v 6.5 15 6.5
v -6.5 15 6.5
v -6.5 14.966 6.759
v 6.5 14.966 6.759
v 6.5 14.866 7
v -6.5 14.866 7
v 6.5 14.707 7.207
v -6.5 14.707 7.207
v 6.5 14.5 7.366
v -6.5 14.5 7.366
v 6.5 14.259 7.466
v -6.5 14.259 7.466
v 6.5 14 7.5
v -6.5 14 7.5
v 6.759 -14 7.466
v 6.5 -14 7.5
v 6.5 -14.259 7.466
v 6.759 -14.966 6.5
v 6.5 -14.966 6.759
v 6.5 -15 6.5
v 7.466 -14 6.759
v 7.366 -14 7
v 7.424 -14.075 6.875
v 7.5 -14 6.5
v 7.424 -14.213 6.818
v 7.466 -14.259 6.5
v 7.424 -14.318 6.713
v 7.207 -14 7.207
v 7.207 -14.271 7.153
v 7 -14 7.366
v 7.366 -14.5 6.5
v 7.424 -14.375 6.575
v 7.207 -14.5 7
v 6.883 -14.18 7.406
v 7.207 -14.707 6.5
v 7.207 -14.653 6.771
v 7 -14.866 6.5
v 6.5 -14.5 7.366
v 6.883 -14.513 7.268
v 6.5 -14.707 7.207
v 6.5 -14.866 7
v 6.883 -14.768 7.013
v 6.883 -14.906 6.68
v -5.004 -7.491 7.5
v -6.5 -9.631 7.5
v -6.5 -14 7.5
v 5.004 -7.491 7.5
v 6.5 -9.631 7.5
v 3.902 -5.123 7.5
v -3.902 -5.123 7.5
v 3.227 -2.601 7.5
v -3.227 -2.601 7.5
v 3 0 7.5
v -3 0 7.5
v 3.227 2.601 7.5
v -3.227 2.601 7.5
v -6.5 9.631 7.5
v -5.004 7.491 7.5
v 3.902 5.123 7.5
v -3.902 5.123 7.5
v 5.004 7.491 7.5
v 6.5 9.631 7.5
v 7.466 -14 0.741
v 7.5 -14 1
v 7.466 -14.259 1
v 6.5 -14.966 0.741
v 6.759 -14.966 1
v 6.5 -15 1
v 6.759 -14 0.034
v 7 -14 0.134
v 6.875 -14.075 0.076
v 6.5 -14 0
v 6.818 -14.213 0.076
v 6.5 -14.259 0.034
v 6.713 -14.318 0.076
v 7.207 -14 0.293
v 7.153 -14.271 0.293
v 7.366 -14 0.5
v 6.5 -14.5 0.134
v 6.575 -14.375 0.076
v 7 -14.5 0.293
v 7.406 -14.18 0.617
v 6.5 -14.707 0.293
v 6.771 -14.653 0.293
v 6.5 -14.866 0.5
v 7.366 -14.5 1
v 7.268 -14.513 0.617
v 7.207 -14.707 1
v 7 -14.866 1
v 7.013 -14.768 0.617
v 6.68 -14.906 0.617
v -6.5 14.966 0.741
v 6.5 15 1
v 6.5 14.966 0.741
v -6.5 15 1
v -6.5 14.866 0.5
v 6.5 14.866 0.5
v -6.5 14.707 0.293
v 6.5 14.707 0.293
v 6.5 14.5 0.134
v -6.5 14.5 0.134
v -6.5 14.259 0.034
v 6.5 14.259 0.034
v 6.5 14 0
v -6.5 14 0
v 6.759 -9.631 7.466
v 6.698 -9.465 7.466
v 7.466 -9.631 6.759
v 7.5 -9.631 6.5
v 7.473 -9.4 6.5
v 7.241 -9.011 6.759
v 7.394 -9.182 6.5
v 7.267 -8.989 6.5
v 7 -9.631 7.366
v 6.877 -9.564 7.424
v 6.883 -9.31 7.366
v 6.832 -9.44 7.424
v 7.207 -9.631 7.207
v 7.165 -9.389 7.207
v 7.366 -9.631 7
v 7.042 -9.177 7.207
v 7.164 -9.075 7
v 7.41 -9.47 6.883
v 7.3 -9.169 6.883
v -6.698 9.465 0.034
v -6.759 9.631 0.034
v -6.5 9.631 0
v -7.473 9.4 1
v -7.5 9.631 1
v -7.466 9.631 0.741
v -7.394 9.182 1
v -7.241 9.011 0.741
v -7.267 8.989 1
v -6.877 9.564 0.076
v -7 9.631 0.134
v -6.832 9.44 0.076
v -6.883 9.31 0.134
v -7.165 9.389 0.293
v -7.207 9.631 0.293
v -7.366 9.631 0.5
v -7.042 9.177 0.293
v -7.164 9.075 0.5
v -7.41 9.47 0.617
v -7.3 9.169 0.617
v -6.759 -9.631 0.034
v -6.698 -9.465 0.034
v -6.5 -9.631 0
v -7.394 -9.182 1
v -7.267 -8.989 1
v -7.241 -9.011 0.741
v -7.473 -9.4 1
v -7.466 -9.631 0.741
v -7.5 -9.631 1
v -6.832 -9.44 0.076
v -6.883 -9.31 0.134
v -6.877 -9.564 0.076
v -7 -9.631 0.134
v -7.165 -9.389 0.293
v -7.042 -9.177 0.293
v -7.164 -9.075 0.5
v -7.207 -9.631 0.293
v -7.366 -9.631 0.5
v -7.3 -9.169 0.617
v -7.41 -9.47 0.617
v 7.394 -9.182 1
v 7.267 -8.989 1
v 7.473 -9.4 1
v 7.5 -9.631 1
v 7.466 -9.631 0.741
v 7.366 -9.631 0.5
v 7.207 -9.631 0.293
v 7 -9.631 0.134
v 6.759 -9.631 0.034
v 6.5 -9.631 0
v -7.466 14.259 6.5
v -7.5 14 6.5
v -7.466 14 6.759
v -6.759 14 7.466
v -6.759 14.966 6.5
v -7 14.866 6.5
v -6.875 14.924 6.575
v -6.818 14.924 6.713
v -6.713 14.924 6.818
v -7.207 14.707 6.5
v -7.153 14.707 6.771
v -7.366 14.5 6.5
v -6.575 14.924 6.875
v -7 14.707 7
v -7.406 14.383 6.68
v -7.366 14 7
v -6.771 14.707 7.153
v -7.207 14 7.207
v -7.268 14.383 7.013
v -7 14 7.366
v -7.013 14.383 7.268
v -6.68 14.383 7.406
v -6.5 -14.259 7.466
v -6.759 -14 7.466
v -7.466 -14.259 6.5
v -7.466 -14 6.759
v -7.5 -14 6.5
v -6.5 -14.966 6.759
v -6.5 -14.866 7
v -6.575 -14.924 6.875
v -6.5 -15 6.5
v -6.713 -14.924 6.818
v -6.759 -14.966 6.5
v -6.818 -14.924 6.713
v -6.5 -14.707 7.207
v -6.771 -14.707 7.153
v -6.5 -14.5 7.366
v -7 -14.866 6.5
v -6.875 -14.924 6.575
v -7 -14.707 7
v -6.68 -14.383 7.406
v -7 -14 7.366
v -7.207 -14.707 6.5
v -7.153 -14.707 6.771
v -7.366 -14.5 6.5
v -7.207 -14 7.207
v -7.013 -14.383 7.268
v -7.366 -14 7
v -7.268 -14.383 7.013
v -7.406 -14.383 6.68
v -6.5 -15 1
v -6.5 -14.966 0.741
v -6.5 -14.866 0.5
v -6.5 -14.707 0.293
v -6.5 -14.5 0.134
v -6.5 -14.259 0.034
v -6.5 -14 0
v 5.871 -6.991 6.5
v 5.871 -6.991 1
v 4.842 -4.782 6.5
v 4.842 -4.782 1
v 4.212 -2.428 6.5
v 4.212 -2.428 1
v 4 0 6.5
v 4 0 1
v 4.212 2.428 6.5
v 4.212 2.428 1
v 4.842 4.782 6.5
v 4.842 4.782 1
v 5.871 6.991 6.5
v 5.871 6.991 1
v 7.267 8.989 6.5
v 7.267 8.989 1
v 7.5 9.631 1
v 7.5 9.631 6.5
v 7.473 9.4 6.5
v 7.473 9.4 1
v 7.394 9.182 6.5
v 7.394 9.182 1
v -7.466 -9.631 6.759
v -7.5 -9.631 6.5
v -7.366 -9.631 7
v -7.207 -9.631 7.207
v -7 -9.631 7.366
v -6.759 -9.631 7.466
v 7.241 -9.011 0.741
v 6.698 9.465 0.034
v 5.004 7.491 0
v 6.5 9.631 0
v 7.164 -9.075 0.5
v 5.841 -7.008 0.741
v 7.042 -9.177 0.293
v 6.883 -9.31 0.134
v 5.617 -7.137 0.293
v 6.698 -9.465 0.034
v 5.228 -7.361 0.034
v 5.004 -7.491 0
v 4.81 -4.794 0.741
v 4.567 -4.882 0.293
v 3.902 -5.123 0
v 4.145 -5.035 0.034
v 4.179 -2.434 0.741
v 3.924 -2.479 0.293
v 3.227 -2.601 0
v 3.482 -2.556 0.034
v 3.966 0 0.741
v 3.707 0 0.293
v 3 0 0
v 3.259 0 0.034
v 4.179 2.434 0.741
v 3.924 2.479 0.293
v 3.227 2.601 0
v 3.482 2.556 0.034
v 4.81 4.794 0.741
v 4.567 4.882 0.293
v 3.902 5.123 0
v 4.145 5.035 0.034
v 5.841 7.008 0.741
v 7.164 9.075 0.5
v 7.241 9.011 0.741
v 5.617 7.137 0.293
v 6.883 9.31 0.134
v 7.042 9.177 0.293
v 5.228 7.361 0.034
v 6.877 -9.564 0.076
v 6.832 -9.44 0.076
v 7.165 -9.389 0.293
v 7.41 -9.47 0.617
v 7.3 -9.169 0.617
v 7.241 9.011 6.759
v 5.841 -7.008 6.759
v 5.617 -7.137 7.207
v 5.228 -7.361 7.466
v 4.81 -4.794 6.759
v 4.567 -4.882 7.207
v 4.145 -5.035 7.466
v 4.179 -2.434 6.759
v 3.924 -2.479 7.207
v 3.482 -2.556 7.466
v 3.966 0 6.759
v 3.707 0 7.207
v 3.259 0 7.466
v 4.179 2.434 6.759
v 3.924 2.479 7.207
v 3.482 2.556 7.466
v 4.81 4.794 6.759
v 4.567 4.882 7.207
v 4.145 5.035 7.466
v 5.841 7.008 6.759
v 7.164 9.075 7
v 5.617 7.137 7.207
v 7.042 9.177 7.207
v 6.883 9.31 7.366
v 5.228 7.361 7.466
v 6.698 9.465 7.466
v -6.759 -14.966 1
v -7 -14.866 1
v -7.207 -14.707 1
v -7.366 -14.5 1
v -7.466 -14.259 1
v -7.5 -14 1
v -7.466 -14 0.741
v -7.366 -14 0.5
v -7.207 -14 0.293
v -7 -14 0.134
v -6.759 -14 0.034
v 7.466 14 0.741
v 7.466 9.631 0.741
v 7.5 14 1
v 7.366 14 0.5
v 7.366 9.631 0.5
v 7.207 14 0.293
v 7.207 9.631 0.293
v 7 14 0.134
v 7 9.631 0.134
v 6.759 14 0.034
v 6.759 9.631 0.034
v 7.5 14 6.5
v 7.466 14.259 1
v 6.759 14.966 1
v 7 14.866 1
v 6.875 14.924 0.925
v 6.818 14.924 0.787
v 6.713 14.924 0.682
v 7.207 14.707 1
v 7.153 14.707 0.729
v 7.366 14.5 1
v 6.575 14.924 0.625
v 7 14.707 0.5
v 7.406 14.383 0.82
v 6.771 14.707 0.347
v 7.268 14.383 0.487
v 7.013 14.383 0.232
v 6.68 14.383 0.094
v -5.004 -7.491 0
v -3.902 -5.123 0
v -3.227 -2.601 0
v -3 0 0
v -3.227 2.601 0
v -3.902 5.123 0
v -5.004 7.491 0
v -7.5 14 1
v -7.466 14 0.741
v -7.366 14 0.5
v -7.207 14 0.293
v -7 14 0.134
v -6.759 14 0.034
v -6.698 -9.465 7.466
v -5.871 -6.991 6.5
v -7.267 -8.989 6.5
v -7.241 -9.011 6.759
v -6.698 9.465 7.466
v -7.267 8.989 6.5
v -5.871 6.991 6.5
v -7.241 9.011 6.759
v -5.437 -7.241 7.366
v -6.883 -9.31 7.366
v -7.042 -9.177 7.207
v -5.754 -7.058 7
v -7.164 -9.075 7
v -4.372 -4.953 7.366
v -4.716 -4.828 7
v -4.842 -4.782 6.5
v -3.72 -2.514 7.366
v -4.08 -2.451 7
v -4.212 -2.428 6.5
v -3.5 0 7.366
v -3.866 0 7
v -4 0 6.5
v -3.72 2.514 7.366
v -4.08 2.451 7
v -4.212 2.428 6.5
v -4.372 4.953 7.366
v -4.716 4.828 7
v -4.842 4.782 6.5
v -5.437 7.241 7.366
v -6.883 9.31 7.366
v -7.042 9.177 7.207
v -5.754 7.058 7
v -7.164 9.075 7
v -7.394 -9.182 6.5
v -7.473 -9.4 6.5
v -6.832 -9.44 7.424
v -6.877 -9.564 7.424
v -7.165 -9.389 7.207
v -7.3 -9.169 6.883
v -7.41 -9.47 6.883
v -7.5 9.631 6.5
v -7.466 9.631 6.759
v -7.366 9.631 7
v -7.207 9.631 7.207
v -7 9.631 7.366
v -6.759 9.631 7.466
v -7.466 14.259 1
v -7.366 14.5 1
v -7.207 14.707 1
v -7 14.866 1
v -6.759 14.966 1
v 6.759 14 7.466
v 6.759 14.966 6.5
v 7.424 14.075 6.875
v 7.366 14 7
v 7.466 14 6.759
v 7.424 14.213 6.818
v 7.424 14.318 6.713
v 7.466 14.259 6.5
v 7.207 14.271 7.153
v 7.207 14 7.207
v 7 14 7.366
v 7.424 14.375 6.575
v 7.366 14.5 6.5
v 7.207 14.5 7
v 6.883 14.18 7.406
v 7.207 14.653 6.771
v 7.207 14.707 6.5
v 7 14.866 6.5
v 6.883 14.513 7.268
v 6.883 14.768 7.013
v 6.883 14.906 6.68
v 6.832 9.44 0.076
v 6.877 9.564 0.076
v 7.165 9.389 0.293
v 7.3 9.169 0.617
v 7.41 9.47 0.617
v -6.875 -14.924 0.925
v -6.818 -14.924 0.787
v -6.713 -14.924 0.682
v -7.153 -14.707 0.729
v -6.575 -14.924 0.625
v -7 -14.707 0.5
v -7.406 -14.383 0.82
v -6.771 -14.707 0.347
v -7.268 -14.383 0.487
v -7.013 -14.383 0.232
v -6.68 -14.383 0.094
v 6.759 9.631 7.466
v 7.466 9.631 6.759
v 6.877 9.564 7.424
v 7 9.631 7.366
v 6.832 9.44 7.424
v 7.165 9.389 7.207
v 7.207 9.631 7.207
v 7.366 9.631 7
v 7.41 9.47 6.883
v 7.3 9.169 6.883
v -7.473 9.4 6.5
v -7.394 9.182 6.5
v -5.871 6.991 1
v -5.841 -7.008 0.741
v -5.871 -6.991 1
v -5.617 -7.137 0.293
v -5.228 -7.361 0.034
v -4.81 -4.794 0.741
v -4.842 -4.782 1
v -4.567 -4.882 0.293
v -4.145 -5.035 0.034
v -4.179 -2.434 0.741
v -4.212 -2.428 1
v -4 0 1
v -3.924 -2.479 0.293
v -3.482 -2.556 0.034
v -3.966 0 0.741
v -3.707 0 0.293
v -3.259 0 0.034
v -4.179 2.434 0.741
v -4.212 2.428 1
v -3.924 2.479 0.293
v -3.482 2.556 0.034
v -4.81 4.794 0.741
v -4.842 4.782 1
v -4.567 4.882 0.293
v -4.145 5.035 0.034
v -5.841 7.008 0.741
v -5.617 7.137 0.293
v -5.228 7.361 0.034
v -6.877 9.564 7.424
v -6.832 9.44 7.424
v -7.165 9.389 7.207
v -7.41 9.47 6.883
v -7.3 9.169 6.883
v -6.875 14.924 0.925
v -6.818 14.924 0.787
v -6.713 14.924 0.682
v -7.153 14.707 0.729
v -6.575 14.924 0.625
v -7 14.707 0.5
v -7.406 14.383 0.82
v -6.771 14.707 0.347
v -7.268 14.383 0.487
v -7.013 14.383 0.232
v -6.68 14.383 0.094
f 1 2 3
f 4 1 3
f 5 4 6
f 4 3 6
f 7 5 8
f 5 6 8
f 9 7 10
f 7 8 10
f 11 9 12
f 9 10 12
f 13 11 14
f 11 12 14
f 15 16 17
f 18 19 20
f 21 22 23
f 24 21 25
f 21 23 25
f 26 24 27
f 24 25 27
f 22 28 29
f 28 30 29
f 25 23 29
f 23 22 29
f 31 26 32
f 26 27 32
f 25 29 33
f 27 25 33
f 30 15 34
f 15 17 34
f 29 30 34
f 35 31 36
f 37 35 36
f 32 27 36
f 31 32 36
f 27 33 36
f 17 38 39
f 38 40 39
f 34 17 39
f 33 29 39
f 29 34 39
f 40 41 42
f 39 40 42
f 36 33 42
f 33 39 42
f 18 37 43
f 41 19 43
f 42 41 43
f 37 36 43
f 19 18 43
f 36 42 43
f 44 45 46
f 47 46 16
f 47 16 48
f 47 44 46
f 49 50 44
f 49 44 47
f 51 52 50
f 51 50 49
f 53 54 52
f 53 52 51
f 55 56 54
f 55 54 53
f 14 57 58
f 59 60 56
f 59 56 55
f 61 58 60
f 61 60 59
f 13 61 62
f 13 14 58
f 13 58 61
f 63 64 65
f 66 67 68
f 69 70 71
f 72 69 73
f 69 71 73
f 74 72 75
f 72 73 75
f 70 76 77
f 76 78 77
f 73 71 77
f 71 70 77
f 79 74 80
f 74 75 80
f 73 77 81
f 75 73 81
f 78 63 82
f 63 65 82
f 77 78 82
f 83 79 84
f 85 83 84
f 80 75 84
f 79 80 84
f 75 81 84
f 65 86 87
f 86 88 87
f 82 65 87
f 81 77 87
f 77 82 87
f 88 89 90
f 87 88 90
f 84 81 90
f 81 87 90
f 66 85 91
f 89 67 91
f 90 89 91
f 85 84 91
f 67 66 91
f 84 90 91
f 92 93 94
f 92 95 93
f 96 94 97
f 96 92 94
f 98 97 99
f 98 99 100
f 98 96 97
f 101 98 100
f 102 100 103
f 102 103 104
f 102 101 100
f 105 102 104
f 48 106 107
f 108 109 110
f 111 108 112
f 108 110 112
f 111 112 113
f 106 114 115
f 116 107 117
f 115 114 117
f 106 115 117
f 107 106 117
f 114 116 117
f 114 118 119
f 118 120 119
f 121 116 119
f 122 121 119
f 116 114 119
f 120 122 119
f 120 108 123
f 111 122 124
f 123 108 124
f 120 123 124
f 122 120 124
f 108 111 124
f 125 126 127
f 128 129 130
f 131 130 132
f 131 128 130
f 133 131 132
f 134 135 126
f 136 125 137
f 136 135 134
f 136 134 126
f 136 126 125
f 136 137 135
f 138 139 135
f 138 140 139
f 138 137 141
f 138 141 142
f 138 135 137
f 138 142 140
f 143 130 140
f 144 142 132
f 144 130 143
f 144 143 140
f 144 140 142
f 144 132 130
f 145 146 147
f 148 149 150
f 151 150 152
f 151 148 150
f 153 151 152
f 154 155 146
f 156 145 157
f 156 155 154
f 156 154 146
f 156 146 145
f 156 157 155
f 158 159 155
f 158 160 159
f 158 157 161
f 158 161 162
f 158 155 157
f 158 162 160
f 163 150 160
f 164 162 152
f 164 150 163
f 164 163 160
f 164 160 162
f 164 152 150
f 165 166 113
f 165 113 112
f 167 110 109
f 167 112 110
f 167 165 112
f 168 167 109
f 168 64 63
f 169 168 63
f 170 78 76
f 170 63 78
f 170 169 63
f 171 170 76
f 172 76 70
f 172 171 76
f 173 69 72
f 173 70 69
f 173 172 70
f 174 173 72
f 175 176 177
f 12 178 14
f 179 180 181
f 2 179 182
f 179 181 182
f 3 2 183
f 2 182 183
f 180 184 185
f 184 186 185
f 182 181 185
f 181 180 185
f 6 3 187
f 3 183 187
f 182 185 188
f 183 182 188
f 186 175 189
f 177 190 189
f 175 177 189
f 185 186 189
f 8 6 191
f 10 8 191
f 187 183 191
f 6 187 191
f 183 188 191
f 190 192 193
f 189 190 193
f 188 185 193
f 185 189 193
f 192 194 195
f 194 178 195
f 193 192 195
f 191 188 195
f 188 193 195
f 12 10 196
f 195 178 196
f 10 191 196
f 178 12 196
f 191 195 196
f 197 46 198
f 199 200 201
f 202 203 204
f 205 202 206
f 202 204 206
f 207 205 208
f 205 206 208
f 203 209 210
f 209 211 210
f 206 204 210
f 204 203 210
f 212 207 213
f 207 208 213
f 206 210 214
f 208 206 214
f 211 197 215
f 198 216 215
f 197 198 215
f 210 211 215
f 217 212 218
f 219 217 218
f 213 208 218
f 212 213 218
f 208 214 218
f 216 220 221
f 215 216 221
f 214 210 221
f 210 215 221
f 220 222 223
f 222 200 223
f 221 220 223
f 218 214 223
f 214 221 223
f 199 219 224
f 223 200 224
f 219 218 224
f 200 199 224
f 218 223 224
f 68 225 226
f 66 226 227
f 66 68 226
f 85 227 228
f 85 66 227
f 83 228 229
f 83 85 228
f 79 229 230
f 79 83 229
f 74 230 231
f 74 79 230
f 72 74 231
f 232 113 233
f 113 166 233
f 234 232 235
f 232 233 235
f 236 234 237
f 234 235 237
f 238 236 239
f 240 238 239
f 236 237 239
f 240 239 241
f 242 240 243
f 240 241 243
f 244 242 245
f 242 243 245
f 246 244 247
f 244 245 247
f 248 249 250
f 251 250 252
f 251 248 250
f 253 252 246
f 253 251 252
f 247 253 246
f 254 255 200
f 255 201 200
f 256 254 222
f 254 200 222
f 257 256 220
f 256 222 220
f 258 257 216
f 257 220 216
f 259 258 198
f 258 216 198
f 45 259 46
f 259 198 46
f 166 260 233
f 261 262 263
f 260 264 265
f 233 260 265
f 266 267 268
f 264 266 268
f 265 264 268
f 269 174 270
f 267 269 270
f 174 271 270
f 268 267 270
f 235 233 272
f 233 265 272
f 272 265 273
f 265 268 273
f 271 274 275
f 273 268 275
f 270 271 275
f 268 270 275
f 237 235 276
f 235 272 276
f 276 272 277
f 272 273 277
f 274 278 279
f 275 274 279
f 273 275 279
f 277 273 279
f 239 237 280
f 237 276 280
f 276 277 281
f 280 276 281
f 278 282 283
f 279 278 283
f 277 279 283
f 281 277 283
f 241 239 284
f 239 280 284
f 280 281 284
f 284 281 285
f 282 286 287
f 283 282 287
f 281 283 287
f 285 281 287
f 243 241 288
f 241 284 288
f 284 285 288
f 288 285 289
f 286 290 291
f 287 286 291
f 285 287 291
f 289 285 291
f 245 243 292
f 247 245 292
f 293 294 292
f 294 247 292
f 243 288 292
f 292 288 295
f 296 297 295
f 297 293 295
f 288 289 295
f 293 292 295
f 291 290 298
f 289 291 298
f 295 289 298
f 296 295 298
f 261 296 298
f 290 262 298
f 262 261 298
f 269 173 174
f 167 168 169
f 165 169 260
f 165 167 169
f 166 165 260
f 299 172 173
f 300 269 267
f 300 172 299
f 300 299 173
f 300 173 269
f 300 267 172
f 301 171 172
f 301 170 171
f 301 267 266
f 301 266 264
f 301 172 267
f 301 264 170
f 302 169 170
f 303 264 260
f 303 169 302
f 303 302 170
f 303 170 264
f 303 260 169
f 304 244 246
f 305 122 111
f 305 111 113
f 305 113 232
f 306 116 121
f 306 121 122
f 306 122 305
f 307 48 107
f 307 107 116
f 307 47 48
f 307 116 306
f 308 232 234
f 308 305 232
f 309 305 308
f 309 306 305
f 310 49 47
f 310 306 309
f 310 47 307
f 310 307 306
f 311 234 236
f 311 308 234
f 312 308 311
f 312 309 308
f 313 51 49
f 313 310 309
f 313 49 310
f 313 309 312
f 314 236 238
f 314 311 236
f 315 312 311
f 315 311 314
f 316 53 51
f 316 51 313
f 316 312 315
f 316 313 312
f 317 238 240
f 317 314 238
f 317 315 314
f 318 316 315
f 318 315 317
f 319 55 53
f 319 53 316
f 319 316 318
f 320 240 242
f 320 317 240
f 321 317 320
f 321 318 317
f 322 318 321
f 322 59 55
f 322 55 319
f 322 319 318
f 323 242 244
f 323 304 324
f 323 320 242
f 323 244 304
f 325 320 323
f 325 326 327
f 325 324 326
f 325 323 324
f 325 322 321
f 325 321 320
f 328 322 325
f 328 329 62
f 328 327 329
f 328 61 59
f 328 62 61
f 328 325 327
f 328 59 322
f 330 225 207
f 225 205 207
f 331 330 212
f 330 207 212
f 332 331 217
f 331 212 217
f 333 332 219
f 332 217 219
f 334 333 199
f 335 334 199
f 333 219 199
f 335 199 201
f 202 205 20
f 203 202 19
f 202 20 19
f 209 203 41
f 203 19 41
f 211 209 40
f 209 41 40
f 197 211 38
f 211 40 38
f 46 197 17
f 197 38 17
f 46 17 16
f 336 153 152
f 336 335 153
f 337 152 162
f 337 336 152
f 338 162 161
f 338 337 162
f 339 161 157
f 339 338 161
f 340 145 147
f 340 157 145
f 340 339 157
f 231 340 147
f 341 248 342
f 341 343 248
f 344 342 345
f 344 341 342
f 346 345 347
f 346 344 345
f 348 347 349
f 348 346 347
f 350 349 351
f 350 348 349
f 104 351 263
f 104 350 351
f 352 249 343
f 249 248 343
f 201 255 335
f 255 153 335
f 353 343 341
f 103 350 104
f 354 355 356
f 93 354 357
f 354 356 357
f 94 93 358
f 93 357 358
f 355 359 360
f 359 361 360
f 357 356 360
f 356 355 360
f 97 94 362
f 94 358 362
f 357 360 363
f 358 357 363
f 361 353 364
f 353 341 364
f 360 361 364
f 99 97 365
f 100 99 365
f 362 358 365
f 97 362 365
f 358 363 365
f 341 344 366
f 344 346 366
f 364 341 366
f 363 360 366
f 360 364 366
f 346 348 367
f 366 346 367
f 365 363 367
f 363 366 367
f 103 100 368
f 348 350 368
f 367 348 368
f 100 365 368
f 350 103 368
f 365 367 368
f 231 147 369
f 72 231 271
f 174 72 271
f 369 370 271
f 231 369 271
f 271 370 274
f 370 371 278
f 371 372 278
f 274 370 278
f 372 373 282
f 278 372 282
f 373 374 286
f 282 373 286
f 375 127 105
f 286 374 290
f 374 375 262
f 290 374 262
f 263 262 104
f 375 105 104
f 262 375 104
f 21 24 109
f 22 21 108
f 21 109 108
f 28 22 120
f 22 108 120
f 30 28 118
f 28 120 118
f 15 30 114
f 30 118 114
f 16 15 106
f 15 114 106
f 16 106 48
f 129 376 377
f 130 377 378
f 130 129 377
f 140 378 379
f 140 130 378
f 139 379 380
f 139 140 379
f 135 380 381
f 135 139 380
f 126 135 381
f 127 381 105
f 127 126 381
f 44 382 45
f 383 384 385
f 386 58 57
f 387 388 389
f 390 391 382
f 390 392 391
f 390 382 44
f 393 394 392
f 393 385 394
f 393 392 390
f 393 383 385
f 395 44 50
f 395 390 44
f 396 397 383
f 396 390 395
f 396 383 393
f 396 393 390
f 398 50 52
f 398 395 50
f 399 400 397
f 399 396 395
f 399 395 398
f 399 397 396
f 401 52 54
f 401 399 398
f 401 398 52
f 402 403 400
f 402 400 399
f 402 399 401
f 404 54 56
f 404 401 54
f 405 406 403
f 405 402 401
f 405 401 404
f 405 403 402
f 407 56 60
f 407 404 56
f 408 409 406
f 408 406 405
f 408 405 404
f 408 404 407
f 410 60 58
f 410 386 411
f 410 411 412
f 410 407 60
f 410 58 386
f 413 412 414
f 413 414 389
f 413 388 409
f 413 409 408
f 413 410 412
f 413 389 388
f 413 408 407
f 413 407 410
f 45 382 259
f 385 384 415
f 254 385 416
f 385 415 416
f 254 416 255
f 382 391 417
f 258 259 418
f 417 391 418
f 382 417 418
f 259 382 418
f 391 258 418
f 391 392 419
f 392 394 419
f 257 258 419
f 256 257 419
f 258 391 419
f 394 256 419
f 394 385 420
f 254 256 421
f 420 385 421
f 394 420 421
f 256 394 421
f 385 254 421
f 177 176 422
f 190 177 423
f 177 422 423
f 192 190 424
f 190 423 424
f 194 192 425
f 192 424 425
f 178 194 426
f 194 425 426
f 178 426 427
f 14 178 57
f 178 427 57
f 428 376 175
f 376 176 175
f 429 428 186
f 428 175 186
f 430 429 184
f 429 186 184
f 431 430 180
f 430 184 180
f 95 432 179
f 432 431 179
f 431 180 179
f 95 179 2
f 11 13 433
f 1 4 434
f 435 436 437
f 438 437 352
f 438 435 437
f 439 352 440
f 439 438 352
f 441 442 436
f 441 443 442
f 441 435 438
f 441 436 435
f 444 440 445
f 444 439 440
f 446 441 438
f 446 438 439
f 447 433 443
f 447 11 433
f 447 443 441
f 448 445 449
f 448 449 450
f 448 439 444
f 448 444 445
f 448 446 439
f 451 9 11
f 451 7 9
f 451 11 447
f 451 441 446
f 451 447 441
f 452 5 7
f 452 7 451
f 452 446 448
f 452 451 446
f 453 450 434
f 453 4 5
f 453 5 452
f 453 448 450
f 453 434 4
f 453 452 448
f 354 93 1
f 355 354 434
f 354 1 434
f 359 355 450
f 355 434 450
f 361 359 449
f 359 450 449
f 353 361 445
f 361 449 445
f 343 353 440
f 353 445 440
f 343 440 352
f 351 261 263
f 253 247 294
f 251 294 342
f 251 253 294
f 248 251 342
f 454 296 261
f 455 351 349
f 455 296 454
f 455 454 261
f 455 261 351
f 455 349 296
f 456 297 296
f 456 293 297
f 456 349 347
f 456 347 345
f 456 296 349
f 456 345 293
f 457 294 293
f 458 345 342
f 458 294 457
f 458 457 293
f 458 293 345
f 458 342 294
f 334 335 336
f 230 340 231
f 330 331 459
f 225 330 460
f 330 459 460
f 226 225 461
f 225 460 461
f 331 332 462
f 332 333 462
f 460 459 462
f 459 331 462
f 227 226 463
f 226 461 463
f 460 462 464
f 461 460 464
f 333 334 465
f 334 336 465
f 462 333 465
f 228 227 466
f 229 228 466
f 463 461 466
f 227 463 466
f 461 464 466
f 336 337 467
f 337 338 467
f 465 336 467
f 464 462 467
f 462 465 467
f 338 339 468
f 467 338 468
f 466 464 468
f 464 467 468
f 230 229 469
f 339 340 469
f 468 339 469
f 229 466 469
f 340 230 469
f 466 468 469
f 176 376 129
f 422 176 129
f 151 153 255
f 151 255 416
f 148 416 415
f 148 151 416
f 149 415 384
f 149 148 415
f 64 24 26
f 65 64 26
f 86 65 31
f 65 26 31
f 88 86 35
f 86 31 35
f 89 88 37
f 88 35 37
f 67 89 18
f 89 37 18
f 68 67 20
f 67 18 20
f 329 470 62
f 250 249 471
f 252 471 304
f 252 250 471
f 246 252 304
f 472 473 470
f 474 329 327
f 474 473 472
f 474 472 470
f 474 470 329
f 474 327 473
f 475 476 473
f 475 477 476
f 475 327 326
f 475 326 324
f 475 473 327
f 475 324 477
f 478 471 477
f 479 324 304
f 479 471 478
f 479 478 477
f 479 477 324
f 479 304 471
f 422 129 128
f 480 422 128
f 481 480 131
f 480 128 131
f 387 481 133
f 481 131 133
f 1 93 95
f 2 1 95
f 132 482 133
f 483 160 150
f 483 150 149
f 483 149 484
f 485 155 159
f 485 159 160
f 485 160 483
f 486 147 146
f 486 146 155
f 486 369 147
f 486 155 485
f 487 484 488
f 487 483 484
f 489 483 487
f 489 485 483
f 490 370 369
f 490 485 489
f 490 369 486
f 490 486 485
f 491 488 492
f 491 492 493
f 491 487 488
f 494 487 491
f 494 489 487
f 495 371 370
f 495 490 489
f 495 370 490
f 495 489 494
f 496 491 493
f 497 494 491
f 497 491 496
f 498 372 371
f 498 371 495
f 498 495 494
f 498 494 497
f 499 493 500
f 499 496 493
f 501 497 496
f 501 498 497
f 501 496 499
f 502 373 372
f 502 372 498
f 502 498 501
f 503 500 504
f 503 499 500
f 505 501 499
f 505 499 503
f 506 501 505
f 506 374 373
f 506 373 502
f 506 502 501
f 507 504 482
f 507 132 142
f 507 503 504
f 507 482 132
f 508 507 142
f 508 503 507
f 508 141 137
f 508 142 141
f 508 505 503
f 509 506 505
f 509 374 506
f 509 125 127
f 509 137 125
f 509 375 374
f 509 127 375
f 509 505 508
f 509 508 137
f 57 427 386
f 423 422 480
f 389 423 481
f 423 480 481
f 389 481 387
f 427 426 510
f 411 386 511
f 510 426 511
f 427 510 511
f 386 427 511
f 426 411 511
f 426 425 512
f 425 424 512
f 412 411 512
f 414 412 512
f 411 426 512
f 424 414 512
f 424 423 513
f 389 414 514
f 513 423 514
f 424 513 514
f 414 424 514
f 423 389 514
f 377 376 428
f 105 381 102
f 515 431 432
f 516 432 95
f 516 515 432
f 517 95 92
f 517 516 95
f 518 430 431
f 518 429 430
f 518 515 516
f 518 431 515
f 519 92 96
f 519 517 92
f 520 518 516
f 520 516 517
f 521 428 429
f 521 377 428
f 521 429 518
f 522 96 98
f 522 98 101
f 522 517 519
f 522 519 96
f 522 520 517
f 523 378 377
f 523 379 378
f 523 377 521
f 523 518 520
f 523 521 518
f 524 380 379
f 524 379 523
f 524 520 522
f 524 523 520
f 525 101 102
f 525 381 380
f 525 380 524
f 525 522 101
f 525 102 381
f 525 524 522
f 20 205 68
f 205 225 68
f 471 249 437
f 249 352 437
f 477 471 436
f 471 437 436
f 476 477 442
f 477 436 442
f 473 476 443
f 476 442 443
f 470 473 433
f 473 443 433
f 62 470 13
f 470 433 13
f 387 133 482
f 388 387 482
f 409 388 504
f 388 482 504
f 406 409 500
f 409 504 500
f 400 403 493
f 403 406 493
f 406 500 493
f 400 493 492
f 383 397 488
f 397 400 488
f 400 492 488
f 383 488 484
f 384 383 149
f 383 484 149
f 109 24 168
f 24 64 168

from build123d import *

# Parameters (mm, degrees)
PAD_DEPTH    = 7.5
SKETCH001_R  = 14
POCKET_DEPTH = 7.501
FILLET_R     = 1


with BuildPart() as part:
    # Sketch → Pad (new body)
    with BuildSketch(Plane.XY):
        Polygon((0, 15), (-7.5, 15), (-7.5, 0), (-7.5, -15), (0, -15), (7.5, -15), (7.5, 0), (7.5, 15), align=None)
    extrude(amount=PAD_DEPTH)

    # Sketch001 → Pocket (cut, through all)
    with BuildSketch(Plane(origin=(0, 0, 0), x_dir=(1, 0, 0), z_dir=(0, 0, -1))):
        with Locations((18, 0)):
            Circle(SKETCH001_R)
        with Locations((-18, 0)):
            Circle(SKETCH001_R)
    extrude(amount=-POCKET_DEPTH, mode=Mode.SUBTRACT)

    # Fillet
    fillet_edges = [part.edges().sort_by_distance(p)[0] for p in [
        (-7.5, -12.130065, 7.5),
        (-3.75, -15, 7.5),
        (3.75, -15, 7.5),
        (7.5, -12.130065, 7.5),
        (-7.5, -12.130065, 0),
        (-7.5, -15, 3.75),
        (-7.5, -9.26013, 3.75),
        (-4.904199, -4.949747, 7.5),
        (-4.904199, 4.949747, 7.5),
        (-4.904199, 4.949747, 0),
        (-4.904199, -4.949747, 0),
        (-7.5, 9.26013, 3.75),
        (-7.5, 12.130065, 0),
        (-7.5, 12.130065, 7.5),
        (-7.5, 15, 3.75),
        (-3.75, 15, 7.5),
        (3.75, 15, 7.5),
        (7.5, 12.130065, 7.5),
        (4, 0, 7.5),
        (7.5, -15, 3.75),
        (7.5, -12.130065, 0),
        (4, 0, 0),
        (7.5, 12.130065, 0),
        (7.5, 9.26013, 3.75),
        (7.5, -9.26013, 3.75),
        (7.5, 15, 3.75),
        (-3.75, 15, 0),
        (3.75, 15, 0),
        (-3.75, -15, 0),
        (3.75, -15, 0),
    ]]
    fillet(fillet_edges, radius=FILLET_R)


solid = part.part
